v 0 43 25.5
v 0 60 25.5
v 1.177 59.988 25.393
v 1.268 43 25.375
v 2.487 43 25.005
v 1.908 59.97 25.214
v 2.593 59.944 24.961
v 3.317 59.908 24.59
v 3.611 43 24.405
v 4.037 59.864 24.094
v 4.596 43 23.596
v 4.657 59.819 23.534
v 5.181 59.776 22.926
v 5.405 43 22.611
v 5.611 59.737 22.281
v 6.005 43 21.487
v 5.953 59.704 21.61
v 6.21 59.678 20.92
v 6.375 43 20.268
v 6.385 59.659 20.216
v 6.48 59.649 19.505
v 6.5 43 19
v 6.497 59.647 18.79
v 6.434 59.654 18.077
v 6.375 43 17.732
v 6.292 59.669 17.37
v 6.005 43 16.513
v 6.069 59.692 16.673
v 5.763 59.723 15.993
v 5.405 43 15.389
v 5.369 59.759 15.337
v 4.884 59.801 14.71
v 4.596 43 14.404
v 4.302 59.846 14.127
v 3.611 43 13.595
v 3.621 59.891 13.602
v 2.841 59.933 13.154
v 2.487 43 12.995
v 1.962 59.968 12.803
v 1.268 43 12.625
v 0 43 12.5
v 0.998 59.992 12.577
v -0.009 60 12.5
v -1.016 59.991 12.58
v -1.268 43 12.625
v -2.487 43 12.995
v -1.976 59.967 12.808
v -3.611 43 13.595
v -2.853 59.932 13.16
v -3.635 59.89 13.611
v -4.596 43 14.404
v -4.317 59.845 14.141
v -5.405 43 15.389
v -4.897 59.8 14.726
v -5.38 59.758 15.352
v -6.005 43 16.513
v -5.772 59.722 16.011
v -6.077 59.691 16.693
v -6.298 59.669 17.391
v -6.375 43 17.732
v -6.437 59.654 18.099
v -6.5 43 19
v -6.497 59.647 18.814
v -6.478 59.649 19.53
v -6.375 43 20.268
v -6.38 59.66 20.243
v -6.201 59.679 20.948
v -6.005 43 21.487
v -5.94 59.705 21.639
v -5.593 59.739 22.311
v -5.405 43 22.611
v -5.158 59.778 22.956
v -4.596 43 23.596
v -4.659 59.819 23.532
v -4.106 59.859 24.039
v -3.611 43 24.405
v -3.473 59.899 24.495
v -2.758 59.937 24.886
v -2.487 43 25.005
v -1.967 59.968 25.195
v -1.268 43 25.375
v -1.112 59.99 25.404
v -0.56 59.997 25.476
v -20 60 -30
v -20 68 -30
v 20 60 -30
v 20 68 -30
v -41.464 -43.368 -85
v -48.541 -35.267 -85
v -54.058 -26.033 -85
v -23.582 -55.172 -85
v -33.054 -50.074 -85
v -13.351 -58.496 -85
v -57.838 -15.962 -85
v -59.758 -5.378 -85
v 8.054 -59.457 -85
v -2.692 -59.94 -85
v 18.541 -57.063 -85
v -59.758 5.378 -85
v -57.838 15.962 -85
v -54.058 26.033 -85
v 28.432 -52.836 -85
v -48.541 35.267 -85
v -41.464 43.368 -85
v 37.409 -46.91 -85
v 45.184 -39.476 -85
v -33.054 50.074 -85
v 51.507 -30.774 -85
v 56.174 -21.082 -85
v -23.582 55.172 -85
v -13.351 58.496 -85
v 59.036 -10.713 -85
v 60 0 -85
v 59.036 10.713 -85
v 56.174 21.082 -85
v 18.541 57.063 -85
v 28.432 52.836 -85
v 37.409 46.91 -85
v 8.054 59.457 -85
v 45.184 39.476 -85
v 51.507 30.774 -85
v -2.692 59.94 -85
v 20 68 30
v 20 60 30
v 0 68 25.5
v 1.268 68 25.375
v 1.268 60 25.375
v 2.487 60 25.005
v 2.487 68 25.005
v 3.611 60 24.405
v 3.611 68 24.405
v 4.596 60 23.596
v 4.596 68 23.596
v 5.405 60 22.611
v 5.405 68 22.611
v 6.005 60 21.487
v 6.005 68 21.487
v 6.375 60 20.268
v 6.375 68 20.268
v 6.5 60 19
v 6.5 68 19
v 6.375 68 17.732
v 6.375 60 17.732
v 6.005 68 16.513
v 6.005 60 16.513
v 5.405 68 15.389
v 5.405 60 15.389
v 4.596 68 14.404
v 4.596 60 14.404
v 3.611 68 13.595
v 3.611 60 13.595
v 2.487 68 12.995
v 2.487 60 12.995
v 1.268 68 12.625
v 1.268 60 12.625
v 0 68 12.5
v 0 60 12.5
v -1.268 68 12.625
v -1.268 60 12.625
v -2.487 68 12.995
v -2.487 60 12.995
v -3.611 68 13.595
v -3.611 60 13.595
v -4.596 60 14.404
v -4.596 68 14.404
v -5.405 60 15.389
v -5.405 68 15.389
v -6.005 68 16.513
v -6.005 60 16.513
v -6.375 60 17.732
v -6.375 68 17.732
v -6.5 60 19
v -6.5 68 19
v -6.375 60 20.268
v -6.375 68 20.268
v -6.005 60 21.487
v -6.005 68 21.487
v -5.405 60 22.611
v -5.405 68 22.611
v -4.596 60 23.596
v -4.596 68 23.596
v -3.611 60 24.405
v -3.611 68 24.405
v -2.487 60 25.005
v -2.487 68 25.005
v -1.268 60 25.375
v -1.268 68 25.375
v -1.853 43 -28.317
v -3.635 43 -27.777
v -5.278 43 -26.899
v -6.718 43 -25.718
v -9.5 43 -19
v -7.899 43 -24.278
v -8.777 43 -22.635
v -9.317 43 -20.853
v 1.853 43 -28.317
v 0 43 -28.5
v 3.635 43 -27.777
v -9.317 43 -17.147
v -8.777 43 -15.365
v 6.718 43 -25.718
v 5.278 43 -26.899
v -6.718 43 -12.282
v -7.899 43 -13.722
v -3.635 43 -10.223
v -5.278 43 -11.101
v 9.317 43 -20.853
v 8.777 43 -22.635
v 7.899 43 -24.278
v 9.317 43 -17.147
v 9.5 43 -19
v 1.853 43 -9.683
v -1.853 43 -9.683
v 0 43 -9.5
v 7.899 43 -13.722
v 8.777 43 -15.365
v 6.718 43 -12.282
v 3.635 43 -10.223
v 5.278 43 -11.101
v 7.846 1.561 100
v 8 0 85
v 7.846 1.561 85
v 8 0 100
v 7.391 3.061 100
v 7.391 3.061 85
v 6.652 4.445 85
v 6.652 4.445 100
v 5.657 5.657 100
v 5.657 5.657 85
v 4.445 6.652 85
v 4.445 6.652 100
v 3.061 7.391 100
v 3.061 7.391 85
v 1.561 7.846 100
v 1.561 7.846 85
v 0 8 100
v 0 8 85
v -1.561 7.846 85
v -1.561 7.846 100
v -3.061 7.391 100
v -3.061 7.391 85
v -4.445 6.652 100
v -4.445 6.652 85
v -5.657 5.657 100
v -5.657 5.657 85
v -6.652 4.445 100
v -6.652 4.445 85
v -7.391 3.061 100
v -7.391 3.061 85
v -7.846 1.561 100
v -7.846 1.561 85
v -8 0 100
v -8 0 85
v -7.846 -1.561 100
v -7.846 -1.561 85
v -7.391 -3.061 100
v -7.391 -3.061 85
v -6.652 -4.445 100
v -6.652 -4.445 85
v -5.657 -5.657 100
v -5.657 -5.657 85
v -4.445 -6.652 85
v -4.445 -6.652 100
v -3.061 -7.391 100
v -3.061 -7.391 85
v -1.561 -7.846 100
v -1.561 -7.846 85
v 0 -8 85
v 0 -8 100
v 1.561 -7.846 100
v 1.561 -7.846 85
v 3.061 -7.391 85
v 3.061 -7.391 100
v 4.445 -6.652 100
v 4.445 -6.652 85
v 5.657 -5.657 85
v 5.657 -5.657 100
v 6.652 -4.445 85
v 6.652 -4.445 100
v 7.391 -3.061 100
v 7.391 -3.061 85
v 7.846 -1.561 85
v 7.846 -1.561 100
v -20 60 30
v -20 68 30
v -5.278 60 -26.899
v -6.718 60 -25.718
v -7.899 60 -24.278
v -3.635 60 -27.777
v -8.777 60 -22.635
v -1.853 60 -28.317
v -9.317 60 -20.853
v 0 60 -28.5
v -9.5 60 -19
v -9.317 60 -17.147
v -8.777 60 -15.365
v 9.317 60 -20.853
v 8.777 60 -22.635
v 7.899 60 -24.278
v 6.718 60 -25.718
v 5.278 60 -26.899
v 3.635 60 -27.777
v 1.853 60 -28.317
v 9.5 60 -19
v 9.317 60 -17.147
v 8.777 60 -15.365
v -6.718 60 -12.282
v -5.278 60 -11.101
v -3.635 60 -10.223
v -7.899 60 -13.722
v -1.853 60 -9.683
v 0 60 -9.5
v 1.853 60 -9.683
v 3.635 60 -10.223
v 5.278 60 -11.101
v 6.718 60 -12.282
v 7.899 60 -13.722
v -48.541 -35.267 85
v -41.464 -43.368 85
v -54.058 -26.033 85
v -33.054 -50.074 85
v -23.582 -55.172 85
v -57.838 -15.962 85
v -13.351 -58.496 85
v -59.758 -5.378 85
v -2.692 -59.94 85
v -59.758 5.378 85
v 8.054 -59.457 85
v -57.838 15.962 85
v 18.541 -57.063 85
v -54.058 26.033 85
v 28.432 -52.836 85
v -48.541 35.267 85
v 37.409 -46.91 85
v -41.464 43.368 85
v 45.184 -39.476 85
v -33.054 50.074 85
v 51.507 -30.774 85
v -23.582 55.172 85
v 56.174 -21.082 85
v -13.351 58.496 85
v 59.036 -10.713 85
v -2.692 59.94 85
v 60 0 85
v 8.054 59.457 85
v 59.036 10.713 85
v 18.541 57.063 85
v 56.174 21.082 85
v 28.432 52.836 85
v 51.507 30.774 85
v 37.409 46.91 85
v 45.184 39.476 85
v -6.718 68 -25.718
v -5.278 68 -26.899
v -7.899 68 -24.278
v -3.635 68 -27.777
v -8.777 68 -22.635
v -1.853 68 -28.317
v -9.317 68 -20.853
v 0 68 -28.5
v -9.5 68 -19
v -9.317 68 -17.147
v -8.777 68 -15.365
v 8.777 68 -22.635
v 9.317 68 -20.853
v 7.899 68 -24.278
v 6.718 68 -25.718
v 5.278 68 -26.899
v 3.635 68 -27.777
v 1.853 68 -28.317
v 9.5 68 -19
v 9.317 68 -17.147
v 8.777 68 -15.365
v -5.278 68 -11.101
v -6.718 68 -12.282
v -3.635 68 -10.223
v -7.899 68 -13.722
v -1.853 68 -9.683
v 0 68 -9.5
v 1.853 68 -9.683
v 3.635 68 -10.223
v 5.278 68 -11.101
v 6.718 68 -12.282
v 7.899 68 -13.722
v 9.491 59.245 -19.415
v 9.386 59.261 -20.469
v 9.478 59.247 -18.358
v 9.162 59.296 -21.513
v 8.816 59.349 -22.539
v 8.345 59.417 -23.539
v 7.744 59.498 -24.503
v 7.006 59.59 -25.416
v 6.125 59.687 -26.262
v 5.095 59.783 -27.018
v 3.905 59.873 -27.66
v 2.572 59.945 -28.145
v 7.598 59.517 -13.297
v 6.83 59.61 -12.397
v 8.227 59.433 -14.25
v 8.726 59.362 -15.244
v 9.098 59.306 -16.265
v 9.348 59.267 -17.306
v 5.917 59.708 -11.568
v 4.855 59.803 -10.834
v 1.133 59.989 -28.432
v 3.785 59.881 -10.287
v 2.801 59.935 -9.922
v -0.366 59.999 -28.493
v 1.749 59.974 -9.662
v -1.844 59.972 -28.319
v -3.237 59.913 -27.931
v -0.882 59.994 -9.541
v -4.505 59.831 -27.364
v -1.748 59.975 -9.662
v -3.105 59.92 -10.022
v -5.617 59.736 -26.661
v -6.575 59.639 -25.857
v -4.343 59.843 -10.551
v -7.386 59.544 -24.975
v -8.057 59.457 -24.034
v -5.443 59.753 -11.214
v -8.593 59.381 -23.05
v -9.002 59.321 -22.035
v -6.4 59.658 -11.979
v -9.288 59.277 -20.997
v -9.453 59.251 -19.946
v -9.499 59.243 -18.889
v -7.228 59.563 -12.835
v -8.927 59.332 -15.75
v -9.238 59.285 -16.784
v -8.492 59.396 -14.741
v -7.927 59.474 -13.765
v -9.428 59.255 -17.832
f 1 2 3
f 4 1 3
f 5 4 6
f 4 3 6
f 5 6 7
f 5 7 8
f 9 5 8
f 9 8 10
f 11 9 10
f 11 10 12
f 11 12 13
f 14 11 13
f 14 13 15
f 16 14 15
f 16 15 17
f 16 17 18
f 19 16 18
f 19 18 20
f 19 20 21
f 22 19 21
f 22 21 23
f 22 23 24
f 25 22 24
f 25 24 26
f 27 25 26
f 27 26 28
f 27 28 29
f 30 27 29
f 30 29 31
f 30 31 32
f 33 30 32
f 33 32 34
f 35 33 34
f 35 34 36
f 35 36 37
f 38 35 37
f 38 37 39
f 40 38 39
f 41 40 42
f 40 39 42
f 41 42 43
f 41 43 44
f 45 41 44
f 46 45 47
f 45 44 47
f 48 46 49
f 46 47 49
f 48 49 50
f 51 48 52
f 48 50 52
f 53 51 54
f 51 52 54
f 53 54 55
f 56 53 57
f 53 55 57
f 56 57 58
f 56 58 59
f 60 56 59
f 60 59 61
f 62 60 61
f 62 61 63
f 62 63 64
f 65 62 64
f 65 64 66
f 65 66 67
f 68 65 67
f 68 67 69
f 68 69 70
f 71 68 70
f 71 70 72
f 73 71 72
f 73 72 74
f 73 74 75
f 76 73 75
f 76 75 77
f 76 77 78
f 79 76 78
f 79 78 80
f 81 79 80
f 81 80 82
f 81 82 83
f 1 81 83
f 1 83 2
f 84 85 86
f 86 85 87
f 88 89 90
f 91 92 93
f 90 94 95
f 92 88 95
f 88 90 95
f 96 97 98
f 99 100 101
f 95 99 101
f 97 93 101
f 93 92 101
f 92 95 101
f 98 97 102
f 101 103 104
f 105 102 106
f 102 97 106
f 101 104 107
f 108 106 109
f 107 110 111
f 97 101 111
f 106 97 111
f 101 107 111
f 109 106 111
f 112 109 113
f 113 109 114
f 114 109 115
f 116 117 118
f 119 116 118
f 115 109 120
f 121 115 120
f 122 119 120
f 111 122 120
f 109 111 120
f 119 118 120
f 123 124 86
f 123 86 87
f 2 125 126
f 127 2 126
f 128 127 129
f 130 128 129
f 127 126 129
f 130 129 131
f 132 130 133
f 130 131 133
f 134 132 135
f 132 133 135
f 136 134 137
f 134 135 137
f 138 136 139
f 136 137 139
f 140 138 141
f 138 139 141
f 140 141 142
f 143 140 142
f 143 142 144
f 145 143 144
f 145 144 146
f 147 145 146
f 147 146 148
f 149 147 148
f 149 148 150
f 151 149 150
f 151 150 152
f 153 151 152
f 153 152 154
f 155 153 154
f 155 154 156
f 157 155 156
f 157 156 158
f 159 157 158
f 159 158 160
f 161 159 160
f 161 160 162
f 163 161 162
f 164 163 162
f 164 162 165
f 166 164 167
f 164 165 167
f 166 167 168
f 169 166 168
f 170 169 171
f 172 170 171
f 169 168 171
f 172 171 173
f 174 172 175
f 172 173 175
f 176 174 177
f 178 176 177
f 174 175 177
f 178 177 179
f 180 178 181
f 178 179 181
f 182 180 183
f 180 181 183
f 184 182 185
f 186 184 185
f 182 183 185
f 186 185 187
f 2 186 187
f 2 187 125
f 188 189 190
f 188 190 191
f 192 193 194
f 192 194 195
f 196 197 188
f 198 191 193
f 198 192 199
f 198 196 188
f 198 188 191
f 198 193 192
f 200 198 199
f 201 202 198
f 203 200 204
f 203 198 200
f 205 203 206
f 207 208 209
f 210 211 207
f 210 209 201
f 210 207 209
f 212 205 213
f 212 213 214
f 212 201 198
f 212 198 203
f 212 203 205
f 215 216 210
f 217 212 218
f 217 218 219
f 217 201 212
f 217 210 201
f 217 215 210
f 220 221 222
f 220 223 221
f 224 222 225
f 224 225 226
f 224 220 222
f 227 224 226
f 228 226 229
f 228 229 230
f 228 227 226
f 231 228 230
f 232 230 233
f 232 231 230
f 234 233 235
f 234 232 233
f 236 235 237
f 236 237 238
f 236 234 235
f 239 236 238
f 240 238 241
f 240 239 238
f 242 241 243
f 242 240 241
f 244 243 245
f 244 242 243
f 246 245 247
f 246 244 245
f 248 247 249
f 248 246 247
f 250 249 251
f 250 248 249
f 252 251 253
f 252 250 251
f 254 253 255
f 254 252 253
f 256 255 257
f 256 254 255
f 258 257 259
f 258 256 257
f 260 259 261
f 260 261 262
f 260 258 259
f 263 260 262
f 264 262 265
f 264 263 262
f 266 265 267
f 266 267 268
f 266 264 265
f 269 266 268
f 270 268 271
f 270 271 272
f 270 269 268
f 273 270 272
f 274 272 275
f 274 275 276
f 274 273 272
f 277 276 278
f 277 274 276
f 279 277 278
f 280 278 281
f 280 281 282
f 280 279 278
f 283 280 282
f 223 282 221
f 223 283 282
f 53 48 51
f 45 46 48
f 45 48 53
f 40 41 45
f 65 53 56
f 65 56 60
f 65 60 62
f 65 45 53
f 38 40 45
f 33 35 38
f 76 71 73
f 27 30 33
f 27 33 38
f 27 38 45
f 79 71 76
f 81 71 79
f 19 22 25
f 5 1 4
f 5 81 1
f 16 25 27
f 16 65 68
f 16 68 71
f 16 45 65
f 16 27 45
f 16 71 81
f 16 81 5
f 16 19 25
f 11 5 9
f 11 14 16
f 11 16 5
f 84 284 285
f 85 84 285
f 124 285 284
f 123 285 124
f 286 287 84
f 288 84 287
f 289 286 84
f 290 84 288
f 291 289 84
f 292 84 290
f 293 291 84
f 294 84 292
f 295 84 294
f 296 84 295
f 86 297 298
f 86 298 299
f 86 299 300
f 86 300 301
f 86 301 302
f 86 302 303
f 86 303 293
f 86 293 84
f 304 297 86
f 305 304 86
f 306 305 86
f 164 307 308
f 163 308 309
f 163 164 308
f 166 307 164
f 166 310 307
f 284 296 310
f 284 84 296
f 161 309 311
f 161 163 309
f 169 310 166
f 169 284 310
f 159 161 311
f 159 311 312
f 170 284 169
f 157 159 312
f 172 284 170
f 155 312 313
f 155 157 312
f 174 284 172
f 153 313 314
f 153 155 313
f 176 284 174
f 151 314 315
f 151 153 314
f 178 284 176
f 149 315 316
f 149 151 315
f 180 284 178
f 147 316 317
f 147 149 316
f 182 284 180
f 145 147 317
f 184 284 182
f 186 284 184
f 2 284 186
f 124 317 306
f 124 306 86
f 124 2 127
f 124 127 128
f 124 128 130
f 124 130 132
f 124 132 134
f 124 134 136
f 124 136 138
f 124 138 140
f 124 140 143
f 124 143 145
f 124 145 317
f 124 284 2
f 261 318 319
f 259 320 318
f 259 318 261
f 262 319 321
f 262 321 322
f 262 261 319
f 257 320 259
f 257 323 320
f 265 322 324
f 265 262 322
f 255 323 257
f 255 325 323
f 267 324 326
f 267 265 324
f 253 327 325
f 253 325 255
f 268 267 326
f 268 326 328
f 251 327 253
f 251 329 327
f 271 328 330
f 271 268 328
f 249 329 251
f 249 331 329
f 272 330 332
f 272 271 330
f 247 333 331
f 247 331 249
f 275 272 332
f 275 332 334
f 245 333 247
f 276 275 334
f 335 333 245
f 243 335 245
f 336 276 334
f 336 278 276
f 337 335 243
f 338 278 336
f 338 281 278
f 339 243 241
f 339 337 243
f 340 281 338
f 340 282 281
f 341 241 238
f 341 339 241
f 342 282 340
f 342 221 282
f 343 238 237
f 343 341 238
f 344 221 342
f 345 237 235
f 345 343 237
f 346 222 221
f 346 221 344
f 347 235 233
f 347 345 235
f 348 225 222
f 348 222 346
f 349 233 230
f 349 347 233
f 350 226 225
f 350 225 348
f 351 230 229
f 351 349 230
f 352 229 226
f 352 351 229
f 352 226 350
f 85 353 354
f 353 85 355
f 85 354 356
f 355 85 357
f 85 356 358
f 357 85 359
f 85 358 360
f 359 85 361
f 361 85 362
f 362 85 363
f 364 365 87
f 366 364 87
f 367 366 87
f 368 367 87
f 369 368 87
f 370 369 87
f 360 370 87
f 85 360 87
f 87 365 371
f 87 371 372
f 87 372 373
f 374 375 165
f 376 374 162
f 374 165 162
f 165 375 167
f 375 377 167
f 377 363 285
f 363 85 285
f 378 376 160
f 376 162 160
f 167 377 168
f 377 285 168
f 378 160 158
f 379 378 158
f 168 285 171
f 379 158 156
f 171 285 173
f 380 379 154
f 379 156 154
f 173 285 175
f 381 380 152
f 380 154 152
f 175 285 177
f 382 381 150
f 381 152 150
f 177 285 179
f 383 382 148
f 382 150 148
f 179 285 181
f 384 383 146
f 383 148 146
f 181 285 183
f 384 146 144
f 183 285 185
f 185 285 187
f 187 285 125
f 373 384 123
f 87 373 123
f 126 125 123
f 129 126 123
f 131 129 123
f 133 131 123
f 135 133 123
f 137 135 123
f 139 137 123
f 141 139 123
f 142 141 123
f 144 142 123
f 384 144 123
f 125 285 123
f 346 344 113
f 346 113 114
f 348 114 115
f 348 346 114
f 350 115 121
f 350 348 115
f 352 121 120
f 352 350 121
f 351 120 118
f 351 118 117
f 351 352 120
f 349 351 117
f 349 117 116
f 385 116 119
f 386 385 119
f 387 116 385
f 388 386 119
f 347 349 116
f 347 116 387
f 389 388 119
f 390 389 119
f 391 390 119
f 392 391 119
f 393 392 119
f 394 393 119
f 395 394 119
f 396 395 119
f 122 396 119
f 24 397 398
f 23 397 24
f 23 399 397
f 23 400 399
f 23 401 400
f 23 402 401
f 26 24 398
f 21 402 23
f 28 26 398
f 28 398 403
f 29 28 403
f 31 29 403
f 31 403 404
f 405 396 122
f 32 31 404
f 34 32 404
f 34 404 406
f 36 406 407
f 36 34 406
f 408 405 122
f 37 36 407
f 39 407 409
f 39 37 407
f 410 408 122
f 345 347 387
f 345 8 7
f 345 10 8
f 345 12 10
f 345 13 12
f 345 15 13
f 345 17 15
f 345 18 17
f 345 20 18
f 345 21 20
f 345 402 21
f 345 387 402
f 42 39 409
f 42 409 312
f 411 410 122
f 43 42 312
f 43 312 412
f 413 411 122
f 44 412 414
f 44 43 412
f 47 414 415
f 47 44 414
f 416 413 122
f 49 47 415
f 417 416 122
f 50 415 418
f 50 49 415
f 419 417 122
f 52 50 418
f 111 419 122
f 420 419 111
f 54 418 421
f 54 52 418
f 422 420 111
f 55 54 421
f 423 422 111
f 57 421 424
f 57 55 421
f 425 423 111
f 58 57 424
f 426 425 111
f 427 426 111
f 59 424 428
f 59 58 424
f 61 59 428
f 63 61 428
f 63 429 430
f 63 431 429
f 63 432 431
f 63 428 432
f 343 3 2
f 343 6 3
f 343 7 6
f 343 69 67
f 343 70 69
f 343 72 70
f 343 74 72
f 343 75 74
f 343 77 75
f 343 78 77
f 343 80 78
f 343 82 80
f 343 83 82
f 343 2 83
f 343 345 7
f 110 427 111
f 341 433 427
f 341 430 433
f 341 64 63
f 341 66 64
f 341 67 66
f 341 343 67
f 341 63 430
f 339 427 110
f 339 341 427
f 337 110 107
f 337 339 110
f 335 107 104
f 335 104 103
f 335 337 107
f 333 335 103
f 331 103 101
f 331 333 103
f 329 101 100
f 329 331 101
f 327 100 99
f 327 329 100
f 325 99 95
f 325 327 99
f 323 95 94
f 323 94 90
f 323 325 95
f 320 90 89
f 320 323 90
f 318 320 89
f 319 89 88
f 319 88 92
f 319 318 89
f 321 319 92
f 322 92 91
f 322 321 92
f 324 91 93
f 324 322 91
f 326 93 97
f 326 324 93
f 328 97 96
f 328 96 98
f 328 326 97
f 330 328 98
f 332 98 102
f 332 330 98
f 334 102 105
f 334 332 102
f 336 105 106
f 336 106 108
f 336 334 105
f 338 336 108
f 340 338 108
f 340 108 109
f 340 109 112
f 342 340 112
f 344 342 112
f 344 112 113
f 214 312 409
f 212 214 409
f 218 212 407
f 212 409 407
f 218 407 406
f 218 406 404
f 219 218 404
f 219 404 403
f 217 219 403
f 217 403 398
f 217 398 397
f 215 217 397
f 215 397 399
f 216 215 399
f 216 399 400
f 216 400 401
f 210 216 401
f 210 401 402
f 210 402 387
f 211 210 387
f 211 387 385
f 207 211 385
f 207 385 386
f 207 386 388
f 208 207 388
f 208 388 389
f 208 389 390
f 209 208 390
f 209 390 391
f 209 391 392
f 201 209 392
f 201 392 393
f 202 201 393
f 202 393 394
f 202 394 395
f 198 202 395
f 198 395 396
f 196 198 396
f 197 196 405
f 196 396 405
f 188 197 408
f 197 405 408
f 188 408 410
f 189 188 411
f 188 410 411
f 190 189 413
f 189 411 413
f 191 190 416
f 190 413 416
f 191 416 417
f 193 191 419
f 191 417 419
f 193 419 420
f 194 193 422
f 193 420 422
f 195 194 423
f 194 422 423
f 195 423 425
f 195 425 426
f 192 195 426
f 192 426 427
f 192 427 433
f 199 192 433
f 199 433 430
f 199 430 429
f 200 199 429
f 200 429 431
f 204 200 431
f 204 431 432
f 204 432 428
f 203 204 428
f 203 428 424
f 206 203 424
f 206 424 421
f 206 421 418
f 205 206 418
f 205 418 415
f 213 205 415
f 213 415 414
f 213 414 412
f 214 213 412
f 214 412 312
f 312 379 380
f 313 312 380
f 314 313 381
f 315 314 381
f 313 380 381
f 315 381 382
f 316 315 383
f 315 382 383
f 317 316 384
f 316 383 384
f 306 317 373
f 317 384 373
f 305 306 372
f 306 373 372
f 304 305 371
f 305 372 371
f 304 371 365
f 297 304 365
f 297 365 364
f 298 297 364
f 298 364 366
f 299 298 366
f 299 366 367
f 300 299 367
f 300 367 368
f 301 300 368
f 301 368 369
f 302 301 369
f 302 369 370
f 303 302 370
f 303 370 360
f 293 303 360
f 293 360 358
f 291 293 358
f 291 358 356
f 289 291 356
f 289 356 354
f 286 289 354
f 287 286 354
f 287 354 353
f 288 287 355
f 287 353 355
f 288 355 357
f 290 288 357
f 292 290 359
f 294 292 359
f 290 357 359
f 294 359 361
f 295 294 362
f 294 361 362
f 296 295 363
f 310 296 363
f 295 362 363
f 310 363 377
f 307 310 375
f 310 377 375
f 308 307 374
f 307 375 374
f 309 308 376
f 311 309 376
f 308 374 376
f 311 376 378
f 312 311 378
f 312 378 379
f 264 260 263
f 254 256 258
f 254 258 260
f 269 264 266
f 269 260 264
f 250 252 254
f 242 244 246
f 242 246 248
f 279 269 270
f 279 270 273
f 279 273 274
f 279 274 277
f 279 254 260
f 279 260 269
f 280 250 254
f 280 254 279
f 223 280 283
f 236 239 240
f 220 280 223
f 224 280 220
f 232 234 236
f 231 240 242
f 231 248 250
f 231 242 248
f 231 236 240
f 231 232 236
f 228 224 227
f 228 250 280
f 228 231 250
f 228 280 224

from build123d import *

# Parameters (mm, degrees)
SKETCH1_R           = 60
BOSS_EXTRUDE2_DEPTH = 85
SKETCH2_W           = 40
SKETCH2_H           = 8
BOSS_EXTRUDE3_DEPTH = 30
SKETCH3_R           = 8
BOSS_EXTRUDE4_DEPTH = 15
SKETCH5_R           = 6.5
SKETCH5_R_2         = 9.5
CUT_EXTRUDE1_DEPTH  = 25


with BuildPart() as part:
    # Sketch1 → Boss-Extrude2 (new, symmetric)
    with BuildSketch(Plane.XY):
        Circle(SKETCH1_R)
    extrude(amount=BOSS_EXTRUDE2_DEPTH, both=True)

    # Sketch3 → Boss-Extrude4 (add, symmetric)
    with BuildSketch(Plane.XY.offset(85)):
        Circle(SKETCH3_R)
    extrude(amount=BOSS_EXTRUDE4_DEPTH, both=True)


with BuildPart() as body_2:
    # Sketch2 → Boss-Extrude3 (new, symmetric)
    with BuildSketch(Plane.XY):
        with Locations((0, 64)):
            Rectangle(SKETCH2_W, SKETCH2_H)
    extrude(amount=BOSS_EXTRUDE3_DEPTH, both=True)


with BuildPart() as cut_extrude1_tool:
    # Sketch5 → Cut-Extrude1 (new body)
    with BuildSketch(Plane(origin=(0, 68, 0), x_dir=(1, 0, 0), z_dir=(0, 1, 0))):
        with Locations(Location((0, -19, 0), (0, 0, 270))):
            Circle(SKETCH5_R)
        with Locations(Location((0, 19, 0), (0, 0, 270))):
            Circle(SKETCH5_R_2)
    extrude(amount=-CUT_EXTRUDE1_DEPTH)


with BuildPart() as part_1:
    add(part.part)

    # Cut-Extrude1: cut by cut_extrude1_tool
    add(cut_extrude1_tool.part, mode=Mode.SUBTRACT)


with BuildPart() as body_2_1:
    add(body_2.part)

    # Cut-Extrude1: cut by cut_extrude1_tool
    add(cut_extrude1_tool.part, mode=Mode.SUBTRACT)


solid = Compound([part_1.part, body_2_1.part])
